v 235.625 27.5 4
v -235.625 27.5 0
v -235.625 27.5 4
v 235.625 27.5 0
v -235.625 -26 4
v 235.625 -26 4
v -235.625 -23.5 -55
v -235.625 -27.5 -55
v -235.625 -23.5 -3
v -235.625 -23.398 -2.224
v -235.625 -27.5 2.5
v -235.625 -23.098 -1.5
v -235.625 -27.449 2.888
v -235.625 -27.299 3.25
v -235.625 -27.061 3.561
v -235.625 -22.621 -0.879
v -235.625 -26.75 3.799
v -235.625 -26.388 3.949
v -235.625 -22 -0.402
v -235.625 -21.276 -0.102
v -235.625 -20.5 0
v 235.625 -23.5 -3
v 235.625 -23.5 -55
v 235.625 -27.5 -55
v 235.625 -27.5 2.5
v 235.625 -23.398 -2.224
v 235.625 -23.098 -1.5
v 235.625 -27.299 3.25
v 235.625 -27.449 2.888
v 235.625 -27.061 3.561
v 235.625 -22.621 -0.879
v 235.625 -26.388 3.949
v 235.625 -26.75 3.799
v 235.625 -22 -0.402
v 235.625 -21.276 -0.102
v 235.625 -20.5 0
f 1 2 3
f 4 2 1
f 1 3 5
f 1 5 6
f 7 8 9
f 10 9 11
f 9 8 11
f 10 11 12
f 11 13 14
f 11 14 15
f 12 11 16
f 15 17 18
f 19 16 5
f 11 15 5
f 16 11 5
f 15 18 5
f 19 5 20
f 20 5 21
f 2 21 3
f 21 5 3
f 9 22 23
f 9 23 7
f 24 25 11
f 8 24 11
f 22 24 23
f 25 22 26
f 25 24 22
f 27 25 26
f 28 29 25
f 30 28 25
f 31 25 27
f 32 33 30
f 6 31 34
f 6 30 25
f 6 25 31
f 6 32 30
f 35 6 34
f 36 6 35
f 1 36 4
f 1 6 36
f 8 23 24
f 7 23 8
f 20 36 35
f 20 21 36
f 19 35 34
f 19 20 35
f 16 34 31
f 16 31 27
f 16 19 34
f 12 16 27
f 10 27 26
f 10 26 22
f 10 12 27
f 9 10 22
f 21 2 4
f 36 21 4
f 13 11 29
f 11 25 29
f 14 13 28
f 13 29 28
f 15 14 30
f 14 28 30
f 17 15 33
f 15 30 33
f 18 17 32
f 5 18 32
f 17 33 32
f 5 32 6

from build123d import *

# Parameters (mm, degrees)
CROQUIS1_W              = 471.25
CROQUIS1_H              = 55
SALIENTE_EXTRUIR1_DEPTH = 4
CROQUIS2_W              = 471.25
CROQUIS2_H              = 4
SALIENTE_EXTRUIR2_DEPTH = 55
REDONDEO1_R             = 3
REDONDEO2_R             = 1.5


with BuildPart() as part:
    # Croquis1 → Saliente-Extruir1 (new body)
    with BuildSketch(Plane.XY):
        Rectangle(CROQUIS1_W, CROQUIS1_H)
    extrude(amount=SALIENTE_EXTRUIR1_DEPTH)

    # Croquis2 → Saliente-Extruir2 (add)
    with BuildSketch(Plane(origin=(0, 0, 0), x_dir=(-1, 0, 0), z_dir=(0, 0, -1))):
        with Locations((0, -25.5)):
            Rectangle(CROQUIS2_W, CROQUIS2_H)
    extrude(amount=SALIENTE_EXTRUIR2_DEPTH)

    # Redondeo1
    redondeo1_edges = [part.edges().sort_by_distance(p)[0] for p in [
        (0, -23.5, 0),
    ]]
    fillet(redondeo1_edges, radius=REDONDEO1_R)

    # Redondeo2
    redondeo2_edges = [part.edges().sort_by_distance(p)[0] for p in [
        (0, -27.5, 4),
    ]]
    fillet(redondeo2_edges, radius=REDONDEO2_R)


solid = part.part
